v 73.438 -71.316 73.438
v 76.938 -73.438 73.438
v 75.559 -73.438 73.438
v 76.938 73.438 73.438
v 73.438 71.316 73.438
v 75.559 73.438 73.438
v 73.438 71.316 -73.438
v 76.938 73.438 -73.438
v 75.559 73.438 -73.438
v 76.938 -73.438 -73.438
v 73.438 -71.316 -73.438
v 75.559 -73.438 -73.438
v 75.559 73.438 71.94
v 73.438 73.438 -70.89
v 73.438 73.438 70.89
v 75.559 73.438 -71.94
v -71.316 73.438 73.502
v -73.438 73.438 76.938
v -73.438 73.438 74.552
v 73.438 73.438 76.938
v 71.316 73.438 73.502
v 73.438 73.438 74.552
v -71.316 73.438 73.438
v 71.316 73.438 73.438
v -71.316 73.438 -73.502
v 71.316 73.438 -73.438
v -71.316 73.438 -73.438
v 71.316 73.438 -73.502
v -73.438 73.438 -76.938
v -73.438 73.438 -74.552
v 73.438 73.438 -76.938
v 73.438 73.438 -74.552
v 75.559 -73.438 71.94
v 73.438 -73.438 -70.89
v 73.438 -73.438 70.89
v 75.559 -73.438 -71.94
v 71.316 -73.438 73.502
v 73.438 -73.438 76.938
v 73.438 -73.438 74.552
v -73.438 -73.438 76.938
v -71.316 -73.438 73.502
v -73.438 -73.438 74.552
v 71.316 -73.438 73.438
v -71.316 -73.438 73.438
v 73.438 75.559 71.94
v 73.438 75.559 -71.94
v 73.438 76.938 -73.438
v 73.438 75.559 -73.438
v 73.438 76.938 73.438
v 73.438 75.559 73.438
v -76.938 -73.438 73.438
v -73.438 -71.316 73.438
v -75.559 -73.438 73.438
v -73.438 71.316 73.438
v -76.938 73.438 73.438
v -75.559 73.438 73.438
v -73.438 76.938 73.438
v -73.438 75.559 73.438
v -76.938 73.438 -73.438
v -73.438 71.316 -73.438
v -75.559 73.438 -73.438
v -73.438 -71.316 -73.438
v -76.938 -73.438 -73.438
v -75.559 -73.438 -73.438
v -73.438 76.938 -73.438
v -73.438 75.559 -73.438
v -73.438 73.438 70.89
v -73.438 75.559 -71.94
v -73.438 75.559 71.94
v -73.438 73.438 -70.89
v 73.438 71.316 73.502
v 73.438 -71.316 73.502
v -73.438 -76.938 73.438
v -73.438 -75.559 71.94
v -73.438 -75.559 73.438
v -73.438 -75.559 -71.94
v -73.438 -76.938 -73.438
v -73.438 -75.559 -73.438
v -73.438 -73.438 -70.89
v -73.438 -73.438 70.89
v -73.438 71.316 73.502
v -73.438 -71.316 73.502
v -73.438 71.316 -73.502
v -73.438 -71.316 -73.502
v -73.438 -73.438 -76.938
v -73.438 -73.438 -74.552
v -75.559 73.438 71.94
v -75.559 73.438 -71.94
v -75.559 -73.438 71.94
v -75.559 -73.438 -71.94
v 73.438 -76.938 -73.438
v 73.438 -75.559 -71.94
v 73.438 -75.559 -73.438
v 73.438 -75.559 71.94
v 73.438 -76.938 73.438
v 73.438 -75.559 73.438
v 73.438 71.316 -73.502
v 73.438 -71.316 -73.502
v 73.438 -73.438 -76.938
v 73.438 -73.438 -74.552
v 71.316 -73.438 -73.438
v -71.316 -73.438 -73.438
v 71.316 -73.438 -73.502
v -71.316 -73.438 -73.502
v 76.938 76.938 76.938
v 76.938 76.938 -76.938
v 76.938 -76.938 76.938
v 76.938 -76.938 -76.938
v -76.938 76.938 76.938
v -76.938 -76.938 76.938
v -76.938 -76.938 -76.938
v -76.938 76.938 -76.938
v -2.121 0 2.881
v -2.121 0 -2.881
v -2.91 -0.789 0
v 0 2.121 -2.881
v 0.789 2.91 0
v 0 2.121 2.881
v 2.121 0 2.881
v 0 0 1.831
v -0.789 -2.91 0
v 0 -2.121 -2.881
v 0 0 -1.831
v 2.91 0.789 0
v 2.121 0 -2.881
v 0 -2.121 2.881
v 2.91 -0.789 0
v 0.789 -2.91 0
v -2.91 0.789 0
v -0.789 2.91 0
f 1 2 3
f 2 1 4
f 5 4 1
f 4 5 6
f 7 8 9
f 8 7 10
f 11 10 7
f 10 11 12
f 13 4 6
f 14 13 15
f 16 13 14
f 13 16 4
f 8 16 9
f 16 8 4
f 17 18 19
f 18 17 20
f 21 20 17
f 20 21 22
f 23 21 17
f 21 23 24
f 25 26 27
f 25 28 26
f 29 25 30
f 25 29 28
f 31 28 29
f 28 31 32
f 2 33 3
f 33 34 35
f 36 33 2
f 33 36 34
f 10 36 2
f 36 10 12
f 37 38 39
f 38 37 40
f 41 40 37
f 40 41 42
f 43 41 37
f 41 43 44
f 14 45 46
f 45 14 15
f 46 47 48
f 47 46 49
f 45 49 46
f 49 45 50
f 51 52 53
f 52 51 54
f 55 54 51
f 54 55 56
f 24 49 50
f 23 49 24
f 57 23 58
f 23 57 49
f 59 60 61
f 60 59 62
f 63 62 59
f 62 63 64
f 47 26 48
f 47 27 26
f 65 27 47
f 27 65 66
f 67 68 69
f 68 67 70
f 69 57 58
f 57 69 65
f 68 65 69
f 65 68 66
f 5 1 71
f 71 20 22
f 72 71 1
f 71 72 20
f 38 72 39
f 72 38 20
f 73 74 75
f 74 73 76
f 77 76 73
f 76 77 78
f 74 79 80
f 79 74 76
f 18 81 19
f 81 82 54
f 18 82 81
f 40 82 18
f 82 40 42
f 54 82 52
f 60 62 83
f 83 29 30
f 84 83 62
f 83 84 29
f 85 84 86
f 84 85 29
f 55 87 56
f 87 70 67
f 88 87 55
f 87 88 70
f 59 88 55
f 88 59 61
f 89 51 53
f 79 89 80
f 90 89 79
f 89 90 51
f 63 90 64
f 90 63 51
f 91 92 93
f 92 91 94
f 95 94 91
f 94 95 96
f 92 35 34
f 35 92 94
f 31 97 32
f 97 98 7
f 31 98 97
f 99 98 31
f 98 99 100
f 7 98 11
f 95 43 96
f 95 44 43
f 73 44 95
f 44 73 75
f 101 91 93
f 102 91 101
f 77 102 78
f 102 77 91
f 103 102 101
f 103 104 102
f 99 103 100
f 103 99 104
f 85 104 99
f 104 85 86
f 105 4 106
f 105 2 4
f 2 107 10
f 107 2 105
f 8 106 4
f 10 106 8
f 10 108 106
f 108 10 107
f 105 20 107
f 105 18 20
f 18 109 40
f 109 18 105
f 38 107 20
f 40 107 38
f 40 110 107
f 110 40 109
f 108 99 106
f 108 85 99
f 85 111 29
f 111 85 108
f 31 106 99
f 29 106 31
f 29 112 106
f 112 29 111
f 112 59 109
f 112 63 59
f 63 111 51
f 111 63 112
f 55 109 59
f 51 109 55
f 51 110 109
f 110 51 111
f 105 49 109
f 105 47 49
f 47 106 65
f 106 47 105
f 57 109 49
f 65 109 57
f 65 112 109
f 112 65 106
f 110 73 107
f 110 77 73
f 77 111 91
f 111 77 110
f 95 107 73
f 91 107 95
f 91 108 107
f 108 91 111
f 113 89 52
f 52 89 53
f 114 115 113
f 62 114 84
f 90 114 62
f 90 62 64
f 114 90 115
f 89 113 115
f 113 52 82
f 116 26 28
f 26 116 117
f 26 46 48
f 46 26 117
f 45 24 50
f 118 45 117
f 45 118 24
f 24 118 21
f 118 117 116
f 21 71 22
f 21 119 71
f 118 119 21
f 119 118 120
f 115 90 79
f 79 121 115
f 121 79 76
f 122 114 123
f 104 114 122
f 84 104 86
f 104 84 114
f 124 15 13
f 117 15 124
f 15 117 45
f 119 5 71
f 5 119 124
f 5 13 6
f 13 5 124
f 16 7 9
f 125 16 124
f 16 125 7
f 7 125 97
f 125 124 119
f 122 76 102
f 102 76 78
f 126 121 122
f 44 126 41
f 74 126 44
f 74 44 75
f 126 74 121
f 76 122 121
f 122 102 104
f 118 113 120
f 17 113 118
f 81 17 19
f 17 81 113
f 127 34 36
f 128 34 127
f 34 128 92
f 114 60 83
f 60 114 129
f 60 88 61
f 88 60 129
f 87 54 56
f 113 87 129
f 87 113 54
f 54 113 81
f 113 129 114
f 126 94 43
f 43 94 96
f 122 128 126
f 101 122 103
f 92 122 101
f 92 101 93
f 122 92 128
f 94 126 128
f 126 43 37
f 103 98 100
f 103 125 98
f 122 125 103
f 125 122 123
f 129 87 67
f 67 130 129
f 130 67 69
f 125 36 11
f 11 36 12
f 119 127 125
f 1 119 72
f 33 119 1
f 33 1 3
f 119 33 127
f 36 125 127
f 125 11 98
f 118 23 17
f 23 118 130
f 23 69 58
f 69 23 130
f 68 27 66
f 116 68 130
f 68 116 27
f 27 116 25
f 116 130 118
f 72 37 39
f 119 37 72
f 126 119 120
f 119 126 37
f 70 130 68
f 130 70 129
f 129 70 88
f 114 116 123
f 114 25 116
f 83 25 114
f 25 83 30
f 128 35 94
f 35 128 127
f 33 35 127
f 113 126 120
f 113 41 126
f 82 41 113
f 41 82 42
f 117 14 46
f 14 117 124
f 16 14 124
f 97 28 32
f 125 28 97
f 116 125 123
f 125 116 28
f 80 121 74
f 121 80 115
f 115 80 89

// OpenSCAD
// Program by Ankur Gupta
// www.github.com/agupta231
// Jan 2017

/**
Permission is hereby granted, free of charge, to any person obtaining a copy
of this software and associated documentation files (the "Software"), to deal
in the Software without restriction, including without limitation the rights
to use, copy, modify, merge, publish, distribute, sublicense, and/or sell
copies of the Software, and to permit persons to whom the Software is
furnished to do so, subject to the following conditions:

The above copyright notice and this permission notice shall be included in all
copies or substantial portions of the Software.

THE SOFTWARE IS PROVIDED "AS IS", WITHOUT WARRANTY OF ANY KIND, EXPRESS OR
IMPLIED, INCLUDING BUT NOT LIMITED TO THE WARRANTIES OF MERCHANTABILITY,
FITNESS FOR A PARTICULAR PURPOSE AND NONINFRINGEMENT. IN NO EVENT SHALL THE
AUTHORS OR COPYRIGHT HOLDERS BE LIABLE FOR ANY CLAIM, DAMAGES OR OTHER
LIABILITY, WHETHER IN AN ACTION OF CONTRACT, TORT OR OTHERWISE, ARISING FROM,
OUT OF OR IN CONNECTION WITH THE SOFTWARE OR THE USE OR OTHER DEALINGS IN THE
SOFTWARE.
**/

init_size = 50;
iteration_multiplier = 0.5;
iterations = 5;
hull_width = 7;
strut_width = 3;

echo(version());
echo("Total Size: ---------");
echo(((init_size * iteration_multiplier) * (1 - pow(iteration_multiplier, iterations))) / (1 - iteration_multiplier) * 2 + init_size);
echo("---------------------");

module aux_cubes(current_iter, starting_pos) {
    iter_size = init_size * pow(iteration_multiplier, current_iter);
    displacement = (init_size * (pow(iteration_multiplier, current_iter) + pow(iteration_multiplier, current_iter - 1))) / 2;
    
    for(i = [[displacement, 0, 0], [-displacement, 0, 0], [0, displacement, 0], [0, -displacement, 0], [0, 0, displacement], [0, 0, -displacement]]) {
        new_pos = i + starting_pos;
        
        translate(i + starting_pos) {
            cube(iter_size, center = true);
        }
        
        if(current_iter < iterations) {
            aux_cubes(current_iter + 1, new_pos);
        }
    }
}

module struts(total_length) {
    strut_length = total_length * sqrt(3) + hull_width / 2;
    
    for(i = [[35, 0, -45], [35, 0, 45], [-35, 0, 45], [-35, 0, -45]]) {
        rotate(i) {
            cube([strut_width, strut_length, strut_width], center = true);
        }
    }
}

module enclosure() {
    total_length = ((init_size * iteration_multiplier) * (1 - pow(iteration_multiplier, iterations))) / (1 - iteration_multiplier) * 2 + init_size;
    
    union() {
        difference() {
            cube(total_length + hull_width, center = true);
        
            for(i = [[hull_width + 1, 0, 0], [0, hull_width + 1, 0], [0, 0, hull_width + 1], [-hull_width - 1, 0, 0], [0, -hull_width - 1, 0], [0, 0, -hull_width - 1]]) {
                translate(i) {
                    cube(total_length, center = true);
                }
            }
        }
        
        struts(total_length);
    }
}

union() {
    //cube(init_size, center = true);
    //saux_cubes(1, [0, 0, 0]);
    
    enclosure();
    
}
